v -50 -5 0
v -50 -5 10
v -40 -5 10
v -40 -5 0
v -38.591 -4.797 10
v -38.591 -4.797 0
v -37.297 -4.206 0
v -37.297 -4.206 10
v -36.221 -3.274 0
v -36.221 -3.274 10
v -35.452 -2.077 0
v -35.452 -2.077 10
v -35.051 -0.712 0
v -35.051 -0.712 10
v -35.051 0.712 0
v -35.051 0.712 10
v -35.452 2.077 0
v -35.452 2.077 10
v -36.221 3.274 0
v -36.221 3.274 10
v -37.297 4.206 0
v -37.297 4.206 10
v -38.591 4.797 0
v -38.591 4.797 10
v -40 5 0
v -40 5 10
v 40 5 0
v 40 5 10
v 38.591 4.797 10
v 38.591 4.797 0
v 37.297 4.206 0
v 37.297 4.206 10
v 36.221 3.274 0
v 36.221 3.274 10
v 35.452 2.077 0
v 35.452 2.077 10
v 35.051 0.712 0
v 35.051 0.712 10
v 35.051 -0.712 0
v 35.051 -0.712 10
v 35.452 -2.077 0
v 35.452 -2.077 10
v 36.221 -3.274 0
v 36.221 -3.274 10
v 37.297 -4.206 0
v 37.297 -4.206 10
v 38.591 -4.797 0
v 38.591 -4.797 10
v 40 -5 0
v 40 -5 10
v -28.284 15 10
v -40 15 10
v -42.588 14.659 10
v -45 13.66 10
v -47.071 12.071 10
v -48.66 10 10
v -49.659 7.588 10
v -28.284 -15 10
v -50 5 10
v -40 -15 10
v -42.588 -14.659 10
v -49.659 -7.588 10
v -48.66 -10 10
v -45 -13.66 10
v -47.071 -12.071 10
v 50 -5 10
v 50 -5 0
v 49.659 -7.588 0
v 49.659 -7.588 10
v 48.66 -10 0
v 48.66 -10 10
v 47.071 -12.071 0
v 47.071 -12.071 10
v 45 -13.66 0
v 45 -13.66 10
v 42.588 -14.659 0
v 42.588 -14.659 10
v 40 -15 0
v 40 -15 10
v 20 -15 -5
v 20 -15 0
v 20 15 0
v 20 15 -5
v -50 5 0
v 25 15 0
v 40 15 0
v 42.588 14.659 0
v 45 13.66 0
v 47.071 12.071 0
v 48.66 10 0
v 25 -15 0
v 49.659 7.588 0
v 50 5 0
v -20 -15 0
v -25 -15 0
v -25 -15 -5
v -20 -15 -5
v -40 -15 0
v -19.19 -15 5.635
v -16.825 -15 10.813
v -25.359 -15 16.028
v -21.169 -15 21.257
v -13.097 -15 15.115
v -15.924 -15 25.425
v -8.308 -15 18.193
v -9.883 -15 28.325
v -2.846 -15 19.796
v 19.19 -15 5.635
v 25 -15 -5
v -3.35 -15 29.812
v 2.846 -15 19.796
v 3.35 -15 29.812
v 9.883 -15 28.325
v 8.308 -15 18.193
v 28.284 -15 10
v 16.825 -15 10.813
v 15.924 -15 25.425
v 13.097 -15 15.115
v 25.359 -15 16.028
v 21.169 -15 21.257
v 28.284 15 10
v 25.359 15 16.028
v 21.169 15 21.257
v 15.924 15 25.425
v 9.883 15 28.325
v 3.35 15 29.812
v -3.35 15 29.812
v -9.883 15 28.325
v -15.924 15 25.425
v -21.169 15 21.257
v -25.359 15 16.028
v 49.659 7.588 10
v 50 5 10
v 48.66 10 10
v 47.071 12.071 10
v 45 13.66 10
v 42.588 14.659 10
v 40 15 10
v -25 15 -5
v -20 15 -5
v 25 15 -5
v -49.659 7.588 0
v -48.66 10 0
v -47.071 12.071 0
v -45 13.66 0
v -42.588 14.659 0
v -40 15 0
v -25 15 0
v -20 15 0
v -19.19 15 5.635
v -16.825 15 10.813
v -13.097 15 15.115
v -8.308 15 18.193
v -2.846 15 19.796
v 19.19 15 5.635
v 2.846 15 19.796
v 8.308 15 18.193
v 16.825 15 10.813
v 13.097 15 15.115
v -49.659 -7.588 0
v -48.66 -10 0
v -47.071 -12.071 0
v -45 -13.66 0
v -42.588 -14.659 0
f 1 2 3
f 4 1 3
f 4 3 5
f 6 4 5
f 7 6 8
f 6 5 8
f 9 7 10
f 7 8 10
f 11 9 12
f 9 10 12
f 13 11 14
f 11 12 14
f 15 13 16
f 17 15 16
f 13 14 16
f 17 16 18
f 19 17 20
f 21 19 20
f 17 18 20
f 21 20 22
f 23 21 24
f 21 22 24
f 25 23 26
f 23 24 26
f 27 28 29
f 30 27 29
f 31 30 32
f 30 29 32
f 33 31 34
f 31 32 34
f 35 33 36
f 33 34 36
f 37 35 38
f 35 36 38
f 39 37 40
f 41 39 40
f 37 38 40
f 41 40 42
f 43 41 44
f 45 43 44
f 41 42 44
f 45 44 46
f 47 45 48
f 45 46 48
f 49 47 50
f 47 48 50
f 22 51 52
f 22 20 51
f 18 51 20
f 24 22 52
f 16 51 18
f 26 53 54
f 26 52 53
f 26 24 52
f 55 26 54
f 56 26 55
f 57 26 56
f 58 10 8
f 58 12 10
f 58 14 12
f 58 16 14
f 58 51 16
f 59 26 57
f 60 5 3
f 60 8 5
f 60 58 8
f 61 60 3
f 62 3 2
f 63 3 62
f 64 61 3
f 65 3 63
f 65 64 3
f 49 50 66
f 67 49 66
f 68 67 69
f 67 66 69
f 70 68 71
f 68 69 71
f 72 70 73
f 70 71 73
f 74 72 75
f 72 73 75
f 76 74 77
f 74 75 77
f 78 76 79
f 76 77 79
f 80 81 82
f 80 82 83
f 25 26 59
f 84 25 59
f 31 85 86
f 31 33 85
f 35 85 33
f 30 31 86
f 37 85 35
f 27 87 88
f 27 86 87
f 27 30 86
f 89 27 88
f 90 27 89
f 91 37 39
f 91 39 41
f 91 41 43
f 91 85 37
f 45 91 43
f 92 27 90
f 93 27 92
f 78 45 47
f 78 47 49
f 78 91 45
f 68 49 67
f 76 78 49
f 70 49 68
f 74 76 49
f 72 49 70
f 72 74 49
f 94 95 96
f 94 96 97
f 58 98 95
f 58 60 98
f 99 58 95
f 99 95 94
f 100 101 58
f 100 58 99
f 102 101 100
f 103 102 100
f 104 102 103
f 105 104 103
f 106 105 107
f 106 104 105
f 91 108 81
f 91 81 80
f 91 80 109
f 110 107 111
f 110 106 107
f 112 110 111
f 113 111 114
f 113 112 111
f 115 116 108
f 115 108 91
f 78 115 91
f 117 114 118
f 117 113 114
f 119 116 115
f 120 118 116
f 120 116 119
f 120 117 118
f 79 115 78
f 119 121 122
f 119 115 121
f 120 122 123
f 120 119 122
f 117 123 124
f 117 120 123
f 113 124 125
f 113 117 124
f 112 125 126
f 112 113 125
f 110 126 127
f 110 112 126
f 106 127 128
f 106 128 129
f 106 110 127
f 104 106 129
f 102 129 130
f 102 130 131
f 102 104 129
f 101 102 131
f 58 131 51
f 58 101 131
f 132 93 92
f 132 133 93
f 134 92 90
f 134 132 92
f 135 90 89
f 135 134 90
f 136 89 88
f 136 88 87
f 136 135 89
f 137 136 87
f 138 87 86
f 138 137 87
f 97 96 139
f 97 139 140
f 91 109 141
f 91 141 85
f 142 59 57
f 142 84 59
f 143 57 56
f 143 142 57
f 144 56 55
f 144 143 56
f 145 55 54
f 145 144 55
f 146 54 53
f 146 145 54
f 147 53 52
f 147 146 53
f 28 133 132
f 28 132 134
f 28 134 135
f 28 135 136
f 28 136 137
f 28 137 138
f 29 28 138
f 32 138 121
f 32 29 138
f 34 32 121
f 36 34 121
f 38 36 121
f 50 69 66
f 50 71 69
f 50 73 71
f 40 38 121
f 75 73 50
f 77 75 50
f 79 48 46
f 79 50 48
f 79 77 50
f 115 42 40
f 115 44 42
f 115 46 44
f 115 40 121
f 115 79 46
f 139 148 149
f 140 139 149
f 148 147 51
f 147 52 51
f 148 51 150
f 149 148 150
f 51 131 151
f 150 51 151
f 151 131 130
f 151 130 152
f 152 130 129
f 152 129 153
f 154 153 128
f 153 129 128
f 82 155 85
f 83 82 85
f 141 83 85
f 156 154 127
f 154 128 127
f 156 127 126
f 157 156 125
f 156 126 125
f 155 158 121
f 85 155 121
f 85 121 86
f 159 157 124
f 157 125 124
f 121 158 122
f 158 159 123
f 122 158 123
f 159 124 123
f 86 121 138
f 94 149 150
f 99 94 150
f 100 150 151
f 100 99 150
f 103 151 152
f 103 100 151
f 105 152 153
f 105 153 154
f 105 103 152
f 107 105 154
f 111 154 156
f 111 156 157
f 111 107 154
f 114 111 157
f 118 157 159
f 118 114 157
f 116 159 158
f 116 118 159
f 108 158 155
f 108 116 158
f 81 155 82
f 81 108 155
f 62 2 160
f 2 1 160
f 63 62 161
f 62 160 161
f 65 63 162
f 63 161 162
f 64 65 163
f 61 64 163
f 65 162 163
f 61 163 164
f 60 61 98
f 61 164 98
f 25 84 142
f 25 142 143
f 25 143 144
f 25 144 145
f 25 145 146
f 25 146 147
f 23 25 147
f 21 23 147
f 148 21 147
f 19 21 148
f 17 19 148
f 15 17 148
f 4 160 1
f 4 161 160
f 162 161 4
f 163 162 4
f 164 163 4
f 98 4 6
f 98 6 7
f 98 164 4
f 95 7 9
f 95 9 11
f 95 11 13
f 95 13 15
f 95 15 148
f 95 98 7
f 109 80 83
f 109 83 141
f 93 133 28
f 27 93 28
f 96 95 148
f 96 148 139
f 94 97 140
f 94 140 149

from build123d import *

# Parameters (mm, degrees)
F1_DEPTH = 15
F2_R     = 10
F4_DEPTH = 10
F6_DEPTH = 10


with BuildPart() as f1:
    # F0 (on Front) → F1 (new body, symmetric)
    with BuildSketch(Plane.XZ):
        with BuildLine():
            Line((-50, 10), (-50, 0))
            Line((-50, 0), (-25, 0))
            Line((-25, 0), (-25, -5))
            Line((-25, -5), (-20, -5))
            Line((-20, -5), (-20, 0))
            ThreePointArc((-20, 0), (0, 20), (20, 0))
            Line((20, 0), (20, -5))
            Line((20, -5), (25, -5))
            Line((25, -5), (25, 0))
            Line((25, 0), (50, 0))
            Line((50, 0), (50, 10))
            Line((50, 10), (28.284271, 10))
            ThreePointArc((28.284271, 10), (0, 30), (-28.284271, 10))
            Line((-28.284271, 10), (-50, 10))
        make_face()
    extrude(amount=F1_DEPTH, both=True)

    # F2
    f2_edges = [f1.edges().sort_by_distance(p)[0] for p in [
        (-50, -15, 5),
        (50, -15, 5),
        (50, 15, 5),
        (-50, 15, 5),
    ]]
    fillet(f2_edges, radius=F2_R)

    # F3 (on face) → F4 (cut, through all)
    with BuildSketch(Plane.XY.offset(10)):
        with BuildLine():
            Line((-40, 5), (-50, 5))
            Line((-50, 5), (-50, -5))
            Line((-50, -5), (-40, -5))
            ThreePointArc((-40, -5), (-35, 0), (-40, 5))
        make_face()
    extrude(amount=-F4_DEPTH, mode=Mode.SUBTRACT)

    # F5 (on face) → F6 (cut, through all)
    with BuildSketch(Plane.XY.offset(10)):
        with BuildLine():
            Line((50, -5), (50, 5))
            Line((50, 5), (40, 5))
            ThreePointArc((40, 5), (35, 0), (40, -5))
            Line((40, -5), (50, -5))
        make_face()
    extrude(amount=-F6_DEPTH, mode=Mode.SUBTRACT)


solid = f1.part
